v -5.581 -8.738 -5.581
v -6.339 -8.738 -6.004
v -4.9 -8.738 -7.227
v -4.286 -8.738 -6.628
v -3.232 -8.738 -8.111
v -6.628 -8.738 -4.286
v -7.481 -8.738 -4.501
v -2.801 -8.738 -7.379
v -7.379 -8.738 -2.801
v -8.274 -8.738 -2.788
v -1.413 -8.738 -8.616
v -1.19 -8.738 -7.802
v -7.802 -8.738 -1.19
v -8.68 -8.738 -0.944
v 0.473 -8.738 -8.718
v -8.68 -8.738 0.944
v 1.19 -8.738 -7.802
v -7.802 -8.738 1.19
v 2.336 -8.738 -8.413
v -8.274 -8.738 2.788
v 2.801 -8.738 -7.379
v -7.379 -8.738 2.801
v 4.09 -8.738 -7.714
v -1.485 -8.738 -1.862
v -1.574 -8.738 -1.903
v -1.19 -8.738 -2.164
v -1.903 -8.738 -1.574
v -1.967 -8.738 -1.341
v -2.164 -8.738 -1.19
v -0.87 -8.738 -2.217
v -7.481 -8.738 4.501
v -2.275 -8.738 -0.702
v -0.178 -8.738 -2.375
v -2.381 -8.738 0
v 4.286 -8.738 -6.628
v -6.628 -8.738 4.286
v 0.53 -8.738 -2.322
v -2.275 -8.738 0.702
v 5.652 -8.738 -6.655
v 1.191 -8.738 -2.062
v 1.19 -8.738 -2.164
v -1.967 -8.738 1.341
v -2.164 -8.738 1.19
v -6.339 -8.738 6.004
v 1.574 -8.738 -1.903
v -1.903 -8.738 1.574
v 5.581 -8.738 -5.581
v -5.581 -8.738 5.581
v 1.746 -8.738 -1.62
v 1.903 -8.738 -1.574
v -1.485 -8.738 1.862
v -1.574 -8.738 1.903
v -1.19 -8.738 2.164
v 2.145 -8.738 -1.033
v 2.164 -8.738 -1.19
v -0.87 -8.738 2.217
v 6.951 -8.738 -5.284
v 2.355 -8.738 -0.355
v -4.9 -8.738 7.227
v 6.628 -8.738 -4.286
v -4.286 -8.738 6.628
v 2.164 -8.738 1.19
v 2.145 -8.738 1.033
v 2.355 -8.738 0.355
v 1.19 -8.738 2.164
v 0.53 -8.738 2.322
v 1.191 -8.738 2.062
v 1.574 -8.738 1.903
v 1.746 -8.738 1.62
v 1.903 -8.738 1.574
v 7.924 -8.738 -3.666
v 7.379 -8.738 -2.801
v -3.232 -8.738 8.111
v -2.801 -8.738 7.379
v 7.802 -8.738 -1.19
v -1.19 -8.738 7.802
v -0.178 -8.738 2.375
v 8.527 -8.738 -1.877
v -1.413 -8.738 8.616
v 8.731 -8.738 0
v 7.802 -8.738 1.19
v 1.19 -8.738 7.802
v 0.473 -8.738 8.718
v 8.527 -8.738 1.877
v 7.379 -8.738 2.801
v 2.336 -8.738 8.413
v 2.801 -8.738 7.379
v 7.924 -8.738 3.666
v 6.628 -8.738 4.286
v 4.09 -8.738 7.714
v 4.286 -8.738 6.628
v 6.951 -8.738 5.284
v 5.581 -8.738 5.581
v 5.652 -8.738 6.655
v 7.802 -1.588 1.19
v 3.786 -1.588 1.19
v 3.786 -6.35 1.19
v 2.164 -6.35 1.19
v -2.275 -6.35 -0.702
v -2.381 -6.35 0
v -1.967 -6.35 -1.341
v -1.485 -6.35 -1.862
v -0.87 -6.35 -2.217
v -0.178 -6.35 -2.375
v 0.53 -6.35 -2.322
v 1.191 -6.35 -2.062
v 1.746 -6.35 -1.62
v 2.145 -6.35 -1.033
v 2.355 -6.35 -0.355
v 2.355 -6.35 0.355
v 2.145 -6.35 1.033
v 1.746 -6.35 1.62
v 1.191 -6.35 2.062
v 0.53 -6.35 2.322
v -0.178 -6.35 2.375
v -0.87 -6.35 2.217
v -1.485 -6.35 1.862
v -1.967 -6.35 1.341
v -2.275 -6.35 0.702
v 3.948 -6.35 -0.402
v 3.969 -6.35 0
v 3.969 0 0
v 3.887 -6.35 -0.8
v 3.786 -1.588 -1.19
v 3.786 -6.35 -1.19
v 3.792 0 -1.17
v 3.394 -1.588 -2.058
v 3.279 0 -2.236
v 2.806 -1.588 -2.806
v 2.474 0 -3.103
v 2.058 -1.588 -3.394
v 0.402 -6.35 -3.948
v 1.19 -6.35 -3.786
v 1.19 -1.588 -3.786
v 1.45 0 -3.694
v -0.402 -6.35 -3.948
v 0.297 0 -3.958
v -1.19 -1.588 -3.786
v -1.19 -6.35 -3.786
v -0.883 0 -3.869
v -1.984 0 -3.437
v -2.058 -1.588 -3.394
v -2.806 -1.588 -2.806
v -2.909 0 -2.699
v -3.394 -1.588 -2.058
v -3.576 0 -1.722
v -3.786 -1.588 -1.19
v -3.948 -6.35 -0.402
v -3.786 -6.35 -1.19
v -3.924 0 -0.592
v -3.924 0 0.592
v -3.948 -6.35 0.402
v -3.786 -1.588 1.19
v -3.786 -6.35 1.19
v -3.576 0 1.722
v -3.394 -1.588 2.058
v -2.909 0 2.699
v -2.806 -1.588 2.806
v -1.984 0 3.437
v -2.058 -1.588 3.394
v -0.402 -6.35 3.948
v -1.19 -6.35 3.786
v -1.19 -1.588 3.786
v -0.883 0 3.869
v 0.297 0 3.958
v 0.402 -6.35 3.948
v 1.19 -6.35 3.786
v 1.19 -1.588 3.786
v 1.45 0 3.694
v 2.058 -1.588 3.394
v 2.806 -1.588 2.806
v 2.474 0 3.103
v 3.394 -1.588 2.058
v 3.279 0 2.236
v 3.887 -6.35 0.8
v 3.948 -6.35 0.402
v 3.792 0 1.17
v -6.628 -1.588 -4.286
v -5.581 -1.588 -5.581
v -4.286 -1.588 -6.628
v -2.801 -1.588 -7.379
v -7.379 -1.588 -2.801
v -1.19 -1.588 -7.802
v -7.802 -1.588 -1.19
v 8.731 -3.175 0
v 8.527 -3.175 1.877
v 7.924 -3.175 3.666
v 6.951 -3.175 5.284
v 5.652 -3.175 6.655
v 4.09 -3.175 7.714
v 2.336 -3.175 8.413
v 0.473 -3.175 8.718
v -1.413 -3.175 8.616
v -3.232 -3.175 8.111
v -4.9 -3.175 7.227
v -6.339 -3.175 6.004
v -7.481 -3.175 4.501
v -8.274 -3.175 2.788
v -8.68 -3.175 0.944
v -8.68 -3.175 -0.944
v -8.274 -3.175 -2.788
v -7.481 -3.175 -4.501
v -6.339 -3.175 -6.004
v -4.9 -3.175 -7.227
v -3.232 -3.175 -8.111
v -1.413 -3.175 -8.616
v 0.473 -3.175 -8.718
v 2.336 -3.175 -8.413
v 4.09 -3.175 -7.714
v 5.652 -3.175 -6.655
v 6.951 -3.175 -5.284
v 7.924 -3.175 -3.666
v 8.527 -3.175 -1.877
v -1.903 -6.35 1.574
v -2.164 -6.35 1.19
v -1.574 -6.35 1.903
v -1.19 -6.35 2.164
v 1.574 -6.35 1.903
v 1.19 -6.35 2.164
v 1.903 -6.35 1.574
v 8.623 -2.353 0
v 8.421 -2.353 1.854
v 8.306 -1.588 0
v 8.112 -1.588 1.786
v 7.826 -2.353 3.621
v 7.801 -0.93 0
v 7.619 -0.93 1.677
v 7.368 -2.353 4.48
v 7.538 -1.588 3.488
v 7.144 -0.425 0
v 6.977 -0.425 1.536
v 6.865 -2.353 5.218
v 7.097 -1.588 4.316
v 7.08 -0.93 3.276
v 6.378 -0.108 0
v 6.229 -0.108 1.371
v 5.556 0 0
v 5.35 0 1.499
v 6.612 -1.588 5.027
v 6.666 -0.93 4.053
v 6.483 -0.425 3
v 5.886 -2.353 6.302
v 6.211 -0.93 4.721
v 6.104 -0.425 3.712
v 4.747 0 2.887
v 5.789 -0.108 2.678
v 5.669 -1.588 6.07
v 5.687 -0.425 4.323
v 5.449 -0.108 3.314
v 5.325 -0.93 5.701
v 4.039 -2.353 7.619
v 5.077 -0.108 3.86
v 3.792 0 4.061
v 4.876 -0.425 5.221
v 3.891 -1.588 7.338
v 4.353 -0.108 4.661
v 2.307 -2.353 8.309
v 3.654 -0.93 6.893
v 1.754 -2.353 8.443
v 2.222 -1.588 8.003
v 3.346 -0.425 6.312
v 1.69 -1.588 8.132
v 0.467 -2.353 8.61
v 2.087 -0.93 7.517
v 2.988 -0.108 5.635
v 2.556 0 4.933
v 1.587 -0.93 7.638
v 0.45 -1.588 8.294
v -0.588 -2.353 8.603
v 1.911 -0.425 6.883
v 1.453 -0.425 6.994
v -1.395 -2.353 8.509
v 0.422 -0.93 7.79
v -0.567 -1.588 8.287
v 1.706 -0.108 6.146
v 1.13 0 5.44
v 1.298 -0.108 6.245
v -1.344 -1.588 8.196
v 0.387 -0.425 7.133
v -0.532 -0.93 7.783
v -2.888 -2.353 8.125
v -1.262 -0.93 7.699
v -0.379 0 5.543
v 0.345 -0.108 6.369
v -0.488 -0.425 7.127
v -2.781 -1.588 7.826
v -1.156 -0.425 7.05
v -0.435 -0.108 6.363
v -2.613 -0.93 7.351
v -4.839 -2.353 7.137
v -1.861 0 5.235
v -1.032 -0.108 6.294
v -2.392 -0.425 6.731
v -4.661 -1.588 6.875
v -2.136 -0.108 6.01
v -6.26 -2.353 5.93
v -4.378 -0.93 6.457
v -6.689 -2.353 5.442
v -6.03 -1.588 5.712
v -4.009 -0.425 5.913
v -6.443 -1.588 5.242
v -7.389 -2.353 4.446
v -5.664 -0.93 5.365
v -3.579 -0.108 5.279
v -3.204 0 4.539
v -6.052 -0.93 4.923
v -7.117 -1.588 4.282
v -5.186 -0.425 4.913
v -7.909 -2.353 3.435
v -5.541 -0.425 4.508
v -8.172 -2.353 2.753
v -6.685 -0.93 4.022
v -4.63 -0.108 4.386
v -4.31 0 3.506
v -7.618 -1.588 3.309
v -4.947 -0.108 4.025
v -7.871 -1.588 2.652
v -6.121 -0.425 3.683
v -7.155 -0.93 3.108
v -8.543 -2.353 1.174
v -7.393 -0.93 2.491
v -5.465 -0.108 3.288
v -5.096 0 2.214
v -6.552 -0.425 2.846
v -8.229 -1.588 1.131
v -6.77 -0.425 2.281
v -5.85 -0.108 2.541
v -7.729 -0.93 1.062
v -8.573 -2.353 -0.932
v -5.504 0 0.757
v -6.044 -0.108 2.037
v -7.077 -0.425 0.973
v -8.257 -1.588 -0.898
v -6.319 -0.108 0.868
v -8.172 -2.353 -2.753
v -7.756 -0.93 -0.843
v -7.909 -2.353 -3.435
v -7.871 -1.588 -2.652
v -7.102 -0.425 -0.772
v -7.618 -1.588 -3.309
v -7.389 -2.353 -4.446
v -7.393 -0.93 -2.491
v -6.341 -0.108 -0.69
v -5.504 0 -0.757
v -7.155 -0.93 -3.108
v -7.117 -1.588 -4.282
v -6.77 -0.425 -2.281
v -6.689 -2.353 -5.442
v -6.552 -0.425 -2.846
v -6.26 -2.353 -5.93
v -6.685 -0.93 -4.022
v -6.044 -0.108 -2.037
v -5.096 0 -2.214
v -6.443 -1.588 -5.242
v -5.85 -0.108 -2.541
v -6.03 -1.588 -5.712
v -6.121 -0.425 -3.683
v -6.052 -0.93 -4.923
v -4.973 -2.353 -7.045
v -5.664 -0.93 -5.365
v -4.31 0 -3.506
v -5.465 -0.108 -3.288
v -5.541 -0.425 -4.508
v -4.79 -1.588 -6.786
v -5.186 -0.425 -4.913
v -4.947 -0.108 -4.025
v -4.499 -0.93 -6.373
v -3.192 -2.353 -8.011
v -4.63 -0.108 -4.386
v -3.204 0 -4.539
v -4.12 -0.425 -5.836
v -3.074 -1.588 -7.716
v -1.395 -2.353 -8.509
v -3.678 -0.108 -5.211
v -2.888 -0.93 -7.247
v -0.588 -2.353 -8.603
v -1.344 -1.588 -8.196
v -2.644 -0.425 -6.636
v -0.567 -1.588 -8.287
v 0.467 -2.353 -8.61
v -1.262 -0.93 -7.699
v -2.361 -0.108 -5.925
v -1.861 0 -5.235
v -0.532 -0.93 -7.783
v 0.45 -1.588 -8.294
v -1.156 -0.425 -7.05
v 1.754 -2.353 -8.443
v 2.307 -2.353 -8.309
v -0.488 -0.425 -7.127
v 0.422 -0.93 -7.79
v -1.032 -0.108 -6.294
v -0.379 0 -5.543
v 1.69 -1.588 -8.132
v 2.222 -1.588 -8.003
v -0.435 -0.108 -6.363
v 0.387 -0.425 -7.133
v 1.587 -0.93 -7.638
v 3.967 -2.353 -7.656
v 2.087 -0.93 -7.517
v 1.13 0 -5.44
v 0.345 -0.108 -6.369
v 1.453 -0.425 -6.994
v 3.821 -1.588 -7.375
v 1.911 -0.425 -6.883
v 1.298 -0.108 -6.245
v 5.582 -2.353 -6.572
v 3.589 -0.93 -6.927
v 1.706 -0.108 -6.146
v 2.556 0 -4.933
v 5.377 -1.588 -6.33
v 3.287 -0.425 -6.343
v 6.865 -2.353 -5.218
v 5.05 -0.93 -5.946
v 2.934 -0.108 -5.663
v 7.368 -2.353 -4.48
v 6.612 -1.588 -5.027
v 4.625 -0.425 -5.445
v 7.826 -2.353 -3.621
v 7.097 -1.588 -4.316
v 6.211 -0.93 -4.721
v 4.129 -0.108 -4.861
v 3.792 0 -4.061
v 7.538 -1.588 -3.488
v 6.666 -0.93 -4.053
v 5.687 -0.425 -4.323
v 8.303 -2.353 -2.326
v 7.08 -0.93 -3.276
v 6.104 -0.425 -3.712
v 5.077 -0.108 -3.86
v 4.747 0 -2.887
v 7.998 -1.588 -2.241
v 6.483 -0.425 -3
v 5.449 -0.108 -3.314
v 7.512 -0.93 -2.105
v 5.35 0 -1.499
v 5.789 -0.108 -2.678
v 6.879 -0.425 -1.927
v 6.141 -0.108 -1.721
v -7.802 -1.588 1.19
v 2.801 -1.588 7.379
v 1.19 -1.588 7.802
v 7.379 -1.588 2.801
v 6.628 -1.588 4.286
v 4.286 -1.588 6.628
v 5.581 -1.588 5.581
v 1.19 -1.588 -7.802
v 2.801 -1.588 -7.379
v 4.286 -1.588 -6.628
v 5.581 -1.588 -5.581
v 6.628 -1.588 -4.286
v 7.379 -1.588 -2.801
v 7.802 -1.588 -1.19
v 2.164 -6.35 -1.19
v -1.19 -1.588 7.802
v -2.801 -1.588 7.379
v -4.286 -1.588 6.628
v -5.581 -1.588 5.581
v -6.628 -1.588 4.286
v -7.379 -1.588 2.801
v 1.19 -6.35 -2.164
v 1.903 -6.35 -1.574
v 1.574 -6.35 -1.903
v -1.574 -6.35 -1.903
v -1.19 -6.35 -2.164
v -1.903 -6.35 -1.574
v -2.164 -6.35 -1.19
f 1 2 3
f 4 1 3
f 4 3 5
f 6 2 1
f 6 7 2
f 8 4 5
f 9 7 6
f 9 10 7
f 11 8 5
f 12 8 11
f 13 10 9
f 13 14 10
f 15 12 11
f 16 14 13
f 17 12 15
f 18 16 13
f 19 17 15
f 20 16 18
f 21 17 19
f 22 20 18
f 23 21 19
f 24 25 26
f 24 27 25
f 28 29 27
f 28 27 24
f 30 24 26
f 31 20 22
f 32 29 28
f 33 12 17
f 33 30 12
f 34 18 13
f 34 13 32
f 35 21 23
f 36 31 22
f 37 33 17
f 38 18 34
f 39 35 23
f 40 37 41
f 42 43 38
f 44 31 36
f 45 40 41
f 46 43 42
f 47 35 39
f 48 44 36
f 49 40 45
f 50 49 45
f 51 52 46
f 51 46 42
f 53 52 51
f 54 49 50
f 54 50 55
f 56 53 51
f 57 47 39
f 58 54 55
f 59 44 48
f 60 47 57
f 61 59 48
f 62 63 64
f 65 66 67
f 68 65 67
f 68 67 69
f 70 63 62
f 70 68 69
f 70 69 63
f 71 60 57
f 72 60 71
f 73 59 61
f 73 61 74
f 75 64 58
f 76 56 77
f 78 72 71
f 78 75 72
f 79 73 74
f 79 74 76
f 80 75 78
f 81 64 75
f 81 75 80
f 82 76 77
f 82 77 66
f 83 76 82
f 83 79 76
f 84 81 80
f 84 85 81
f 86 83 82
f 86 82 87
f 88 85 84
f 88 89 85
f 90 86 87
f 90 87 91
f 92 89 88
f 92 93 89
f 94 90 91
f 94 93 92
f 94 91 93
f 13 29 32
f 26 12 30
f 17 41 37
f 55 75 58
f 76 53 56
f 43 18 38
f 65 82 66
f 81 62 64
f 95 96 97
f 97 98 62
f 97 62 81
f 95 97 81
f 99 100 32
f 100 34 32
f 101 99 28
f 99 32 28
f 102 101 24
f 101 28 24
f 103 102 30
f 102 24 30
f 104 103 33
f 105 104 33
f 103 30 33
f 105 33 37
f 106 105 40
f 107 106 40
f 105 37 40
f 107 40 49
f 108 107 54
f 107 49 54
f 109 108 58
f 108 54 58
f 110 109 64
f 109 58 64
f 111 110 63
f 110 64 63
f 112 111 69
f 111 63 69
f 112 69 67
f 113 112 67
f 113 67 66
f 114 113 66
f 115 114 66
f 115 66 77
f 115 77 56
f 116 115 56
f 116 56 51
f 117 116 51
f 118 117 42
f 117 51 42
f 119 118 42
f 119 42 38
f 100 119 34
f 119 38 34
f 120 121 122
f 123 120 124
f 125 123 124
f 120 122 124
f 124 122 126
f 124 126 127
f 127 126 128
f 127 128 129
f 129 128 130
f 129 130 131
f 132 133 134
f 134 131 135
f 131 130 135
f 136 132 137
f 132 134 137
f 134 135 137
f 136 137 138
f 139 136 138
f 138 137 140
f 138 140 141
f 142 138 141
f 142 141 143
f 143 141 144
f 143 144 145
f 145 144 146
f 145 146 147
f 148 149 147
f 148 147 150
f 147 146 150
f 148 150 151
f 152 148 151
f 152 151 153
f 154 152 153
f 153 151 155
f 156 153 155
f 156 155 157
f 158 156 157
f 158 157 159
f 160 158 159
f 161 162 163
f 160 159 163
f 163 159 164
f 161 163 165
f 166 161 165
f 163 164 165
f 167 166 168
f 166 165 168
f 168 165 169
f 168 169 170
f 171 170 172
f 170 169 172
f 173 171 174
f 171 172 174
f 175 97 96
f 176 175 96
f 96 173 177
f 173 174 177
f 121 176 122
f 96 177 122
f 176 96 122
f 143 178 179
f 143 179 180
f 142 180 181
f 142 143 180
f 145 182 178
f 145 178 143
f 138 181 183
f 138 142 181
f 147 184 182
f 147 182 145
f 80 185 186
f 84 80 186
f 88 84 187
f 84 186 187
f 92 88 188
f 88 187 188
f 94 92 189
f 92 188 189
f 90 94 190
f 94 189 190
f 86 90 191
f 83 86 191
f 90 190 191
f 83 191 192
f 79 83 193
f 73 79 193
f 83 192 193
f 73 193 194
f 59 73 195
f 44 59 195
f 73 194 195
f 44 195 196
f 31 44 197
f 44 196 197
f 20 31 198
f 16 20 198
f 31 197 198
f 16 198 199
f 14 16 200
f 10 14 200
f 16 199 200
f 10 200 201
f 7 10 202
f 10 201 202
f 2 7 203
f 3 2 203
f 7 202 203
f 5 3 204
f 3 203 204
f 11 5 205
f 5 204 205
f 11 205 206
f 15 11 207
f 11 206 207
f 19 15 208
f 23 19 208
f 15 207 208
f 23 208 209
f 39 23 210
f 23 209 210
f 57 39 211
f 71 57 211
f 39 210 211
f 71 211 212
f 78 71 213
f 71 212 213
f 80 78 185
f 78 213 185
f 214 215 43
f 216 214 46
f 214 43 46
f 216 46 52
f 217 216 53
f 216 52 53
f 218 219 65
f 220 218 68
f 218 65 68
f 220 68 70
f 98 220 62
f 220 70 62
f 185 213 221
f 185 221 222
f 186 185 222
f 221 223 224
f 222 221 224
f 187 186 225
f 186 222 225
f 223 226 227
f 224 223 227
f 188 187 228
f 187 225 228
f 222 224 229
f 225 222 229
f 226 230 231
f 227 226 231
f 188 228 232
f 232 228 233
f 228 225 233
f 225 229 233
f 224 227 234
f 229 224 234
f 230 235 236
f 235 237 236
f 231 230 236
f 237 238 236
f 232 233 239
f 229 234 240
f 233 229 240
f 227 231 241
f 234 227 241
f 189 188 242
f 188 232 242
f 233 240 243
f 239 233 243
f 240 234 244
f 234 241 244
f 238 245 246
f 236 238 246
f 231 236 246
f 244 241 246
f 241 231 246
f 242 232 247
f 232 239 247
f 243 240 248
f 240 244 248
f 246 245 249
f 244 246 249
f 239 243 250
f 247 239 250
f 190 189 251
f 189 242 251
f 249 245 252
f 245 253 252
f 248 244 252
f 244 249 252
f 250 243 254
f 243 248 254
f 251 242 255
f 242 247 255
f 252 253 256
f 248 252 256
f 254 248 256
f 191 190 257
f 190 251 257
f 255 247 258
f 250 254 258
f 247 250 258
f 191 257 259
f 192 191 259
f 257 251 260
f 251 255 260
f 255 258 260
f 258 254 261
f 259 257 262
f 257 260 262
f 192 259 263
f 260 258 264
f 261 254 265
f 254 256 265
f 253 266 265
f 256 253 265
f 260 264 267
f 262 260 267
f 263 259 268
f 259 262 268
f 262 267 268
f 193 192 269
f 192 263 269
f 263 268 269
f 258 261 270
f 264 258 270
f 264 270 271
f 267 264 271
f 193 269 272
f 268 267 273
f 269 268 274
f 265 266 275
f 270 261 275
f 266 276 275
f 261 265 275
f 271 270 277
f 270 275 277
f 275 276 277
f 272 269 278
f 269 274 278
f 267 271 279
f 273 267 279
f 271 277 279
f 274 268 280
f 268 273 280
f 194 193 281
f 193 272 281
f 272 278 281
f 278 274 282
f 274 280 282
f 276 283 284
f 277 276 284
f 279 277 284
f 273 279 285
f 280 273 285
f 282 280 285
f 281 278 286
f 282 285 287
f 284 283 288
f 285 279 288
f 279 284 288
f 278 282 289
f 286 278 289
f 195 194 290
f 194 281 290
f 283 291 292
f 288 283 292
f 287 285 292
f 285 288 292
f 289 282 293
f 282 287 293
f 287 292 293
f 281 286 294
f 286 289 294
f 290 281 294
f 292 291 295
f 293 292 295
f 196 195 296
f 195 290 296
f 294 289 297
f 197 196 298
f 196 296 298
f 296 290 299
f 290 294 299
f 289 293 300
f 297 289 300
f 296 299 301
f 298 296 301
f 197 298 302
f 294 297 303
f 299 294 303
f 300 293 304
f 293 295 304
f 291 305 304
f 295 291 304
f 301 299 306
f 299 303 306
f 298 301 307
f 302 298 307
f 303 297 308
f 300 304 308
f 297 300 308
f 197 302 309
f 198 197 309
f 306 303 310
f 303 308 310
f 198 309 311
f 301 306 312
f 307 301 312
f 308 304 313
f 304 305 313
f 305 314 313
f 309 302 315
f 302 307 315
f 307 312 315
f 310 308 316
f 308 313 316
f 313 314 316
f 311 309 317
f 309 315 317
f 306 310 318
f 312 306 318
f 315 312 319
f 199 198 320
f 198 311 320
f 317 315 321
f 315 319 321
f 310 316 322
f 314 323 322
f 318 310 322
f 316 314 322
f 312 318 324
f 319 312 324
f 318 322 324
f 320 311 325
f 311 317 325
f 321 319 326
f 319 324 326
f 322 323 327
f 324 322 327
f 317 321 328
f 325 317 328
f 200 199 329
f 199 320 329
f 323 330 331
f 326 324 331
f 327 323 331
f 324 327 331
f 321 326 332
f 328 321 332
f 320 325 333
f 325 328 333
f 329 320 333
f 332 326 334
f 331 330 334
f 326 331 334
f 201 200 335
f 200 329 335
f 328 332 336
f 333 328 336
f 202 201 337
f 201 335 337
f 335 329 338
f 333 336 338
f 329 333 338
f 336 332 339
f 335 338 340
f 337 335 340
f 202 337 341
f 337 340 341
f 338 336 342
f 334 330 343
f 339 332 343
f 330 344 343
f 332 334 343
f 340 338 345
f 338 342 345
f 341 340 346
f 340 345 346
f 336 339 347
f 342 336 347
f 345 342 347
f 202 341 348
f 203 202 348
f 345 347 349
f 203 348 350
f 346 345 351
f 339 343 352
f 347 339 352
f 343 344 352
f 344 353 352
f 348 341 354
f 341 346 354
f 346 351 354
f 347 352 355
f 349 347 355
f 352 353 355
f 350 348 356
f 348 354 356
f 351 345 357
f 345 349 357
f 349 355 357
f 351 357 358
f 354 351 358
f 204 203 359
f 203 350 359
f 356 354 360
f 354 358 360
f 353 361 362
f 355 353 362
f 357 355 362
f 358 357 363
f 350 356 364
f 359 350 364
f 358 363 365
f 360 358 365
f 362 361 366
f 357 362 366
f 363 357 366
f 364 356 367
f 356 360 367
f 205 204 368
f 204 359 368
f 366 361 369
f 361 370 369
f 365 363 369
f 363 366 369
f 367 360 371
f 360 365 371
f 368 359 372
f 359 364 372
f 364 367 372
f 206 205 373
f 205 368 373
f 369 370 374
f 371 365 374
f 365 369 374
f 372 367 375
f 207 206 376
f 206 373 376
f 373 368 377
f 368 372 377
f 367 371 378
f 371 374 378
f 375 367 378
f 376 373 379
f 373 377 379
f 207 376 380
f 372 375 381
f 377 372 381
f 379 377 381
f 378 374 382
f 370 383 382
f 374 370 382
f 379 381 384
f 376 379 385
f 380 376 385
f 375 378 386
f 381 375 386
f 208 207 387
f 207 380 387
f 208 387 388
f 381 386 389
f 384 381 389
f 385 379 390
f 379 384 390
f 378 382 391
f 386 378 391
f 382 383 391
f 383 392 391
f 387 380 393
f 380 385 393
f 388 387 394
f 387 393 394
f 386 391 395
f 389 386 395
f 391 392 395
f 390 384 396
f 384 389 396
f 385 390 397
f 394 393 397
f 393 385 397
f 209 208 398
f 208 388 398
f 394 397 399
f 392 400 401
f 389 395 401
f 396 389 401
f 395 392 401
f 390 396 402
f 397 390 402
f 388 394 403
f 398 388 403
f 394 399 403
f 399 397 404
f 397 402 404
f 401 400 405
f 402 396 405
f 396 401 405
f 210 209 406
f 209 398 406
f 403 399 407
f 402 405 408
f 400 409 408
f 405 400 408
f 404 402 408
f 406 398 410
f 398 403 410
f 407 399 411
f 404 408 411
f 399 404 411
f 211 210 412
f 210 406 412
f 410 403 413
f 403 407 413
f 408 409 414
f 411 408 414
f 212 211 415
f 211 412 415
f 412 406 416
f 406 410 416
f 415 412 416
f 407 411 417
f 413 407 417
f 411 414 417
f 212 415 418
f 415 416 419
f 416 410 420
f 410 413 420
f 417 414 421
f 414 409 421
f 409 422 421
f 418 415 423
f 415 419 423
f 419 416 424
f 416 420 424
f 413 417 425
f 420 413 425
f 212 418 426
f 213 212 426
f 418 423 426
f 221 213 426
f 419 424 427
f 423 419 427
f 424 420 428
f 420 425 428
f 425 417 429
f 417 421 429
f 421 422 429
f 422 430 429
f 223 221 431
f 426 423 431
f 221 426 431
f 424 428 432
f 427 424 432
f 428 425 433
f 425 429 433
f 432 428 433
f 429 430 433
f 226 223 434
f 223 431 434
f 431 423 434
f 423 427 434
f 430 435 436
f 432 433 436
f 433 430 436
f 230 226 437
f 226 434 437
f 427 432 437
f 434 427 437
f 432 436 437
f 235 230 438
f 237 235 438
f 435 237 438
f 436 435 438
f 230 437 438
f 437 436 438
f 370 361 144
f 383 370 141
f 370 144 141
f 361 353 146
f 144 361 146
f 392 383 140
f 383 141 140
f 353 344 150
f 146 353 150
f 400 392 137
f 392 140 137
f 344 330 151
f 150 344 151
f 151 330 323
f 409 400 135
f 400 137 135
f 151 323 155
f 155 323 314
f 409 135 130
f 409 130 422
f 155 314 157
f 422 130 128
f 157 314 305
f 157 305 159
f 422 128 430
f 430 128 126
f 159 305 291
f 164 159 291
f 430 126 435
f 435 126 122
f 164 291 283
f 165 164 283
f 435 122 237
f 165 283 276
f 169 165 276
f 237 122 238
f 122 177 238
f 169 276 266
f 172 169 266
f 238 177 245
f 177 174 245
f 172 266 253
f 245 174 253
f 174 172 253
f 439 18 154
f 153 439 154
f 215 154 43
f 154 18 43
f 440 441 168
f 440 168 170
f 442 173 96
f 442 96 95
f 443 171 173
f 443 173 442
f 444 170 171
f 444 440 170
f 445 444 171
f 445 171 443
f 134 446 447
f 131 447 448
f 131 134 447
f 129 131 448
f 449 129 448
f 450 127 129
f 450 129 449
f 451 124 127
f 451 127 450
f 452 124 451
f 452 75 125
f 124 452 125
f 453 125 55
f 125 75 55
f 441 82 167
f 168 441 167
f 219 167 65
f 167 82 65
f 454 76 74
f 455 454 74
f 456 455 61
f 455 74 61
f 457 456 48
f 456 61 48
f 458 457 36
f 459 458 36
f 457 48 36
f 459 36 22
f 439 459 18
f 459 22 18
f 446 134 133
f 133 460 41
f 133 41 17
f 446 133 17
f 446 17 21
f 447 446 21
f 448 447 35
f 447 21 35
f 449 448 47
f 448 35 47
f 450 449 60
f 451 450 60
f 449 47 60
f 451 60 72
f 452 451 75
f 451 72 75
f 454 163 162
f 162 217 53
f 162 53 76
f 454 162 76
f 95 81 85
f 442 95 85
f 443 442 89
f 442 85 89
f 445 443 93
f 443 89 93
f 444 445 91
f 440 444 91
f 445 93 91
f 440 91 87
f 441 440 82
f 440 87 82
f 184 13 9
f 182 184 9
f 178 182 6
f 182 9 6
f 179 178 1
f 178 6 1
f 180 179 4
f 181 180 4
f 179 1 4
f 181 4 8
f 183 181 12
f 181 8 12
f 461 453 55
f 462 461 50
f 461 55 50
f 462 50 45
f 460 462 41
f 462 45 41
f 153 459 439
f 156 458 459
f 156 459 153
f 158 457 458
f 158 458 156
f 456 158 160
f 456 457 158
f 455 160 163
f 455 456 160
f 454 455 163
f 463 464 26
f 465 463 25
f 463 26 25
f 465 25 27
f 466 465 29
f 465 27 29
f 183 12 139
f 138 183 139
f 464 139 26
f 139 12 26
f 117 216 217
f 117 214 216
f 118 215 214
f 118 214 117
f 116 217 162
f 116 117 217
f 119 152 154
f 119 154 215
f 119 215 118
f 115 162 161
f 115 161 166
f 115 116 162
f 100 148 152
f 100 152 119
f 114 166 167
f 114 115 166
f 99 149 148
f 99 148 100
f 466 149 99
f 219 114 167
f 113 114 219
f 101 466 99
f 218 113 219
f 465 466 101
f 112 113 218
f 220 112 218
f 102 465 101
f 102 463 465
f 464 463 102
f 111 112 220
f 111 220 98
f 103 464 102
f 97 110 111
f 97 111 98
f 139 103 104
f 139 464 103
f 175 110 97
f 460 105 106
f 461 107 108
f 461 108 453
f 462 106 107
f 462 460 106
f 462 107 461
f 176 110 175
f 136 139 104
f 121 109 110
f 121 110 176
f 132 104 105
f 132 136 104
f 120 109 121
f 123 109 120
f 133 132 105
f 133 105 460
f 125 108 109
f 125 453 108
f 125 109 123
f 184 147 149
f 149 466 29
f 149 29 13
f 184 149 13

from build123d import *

# Parameters (mm, degrees)
F0_R           = 8.73125
F0_R_2         = 7.9375
F0_R_3         = 2.38125
F1_DEPTH       = 8.7376
F3_DEPTH       = 7.1501
F4_D           = 4.7625
F4_CBORE_D     = 7.9375
F4_CBORE_DEPTH = 6.35
F5_R           = 3.175


with BuildPart() as f1:
    # F0 (on Front) → F1 (new body)
    with BuildSketch(Plane.XZ):
        Circle(F0_R)
        Circle(F0_R_2, mode=Mode.SUBTRACT)
        Circle(F0_R_2)
        Circle(F0_R_3, mode=Mode.SUBTRACT)
        Circle(F0_R_3)
    extrude(amount=F1_DEPTH)

    # F2 (on face) → F3 (cut)
    with BuildSketch(Plane.XZ.offset(8.7376)):
        with BuildLine():
            ThreePointArc((1.190381, 2.163987), (1.746403, 1.746403), (2.163987, 1.190381))
            Line((2.163987, 1.190381), (7.802441, 1.190381))
            ThreePointArc((7.802441, 1.190381), (5.580999, 5.580999), (1.190381, 7.802441))
            Line((1.190381, 7.802441), (1.190381, 2.163987))
        make_face()
        with BuildLine():
            Line((-1.190381, 2.163987), (-1.190381, 7.802441))
            ThreePointArc((-1.190381, 7.802441), (-5.580999, 5.580999), (-7.802441, 1.190381))
            Line((-7.802441, 1.190381), (-2.163987, 1.190381))
            ThreePointArc((-2.163987, 1.190381), (-1.746403, 1.746403), (-1.190381, 2.163987))
        make_face()
        with BuildLine():
            Line((-2.163987, -1.190381), (-7.802441, -1.190381))
            ThreePointArc((-7.802441, -1.190381), (-5.580999, -5.580999), (-1.190381, -7.802441))
            Line((-1.190381, -7.802441), (-1.190381, -2.163987))
            ThreePointArc((-1.190381, -2.163987), (-1.746403, -1.746403), (-2.163987, -1.190381))
        make_face()
        with BuildLine():
            Line((1.190381, -2.163987), (1.190381, -7.802441))
            ThreePointArc((1.190381, -7.802441), (5.580999, -5.580999), (7.802441, -1.190381))
            Line((7.802441, -1.190381), (2.163987, -1.190381))
            ThreePointArc((2.163987, -1.190381), (1.746403, -1.746403), (1.190381, -2.163987))
        make_face()
    extrude(amount=-F3_DEPTH, mode=Mode.SUBTRACT)

    # F4 (through all)
    with Locations(Plane(origin=(0, 0, 0), x_dir=(1, 0, 0), z_dir=(0, 1, 0))):
        with Locations((0, 0)):
            CounterBoreHole(F4_D / 2, F4_CBORE_D / 2, F4_CBORE_DEPTH)

    # F5
    f5_edges = [f1.edges().sort_by_distance(p)[0] for p in [
        (-8.73125, 0, 0),
    ]]
    fillet(f5_edges, radius=F5_R)


solid = f1.part
